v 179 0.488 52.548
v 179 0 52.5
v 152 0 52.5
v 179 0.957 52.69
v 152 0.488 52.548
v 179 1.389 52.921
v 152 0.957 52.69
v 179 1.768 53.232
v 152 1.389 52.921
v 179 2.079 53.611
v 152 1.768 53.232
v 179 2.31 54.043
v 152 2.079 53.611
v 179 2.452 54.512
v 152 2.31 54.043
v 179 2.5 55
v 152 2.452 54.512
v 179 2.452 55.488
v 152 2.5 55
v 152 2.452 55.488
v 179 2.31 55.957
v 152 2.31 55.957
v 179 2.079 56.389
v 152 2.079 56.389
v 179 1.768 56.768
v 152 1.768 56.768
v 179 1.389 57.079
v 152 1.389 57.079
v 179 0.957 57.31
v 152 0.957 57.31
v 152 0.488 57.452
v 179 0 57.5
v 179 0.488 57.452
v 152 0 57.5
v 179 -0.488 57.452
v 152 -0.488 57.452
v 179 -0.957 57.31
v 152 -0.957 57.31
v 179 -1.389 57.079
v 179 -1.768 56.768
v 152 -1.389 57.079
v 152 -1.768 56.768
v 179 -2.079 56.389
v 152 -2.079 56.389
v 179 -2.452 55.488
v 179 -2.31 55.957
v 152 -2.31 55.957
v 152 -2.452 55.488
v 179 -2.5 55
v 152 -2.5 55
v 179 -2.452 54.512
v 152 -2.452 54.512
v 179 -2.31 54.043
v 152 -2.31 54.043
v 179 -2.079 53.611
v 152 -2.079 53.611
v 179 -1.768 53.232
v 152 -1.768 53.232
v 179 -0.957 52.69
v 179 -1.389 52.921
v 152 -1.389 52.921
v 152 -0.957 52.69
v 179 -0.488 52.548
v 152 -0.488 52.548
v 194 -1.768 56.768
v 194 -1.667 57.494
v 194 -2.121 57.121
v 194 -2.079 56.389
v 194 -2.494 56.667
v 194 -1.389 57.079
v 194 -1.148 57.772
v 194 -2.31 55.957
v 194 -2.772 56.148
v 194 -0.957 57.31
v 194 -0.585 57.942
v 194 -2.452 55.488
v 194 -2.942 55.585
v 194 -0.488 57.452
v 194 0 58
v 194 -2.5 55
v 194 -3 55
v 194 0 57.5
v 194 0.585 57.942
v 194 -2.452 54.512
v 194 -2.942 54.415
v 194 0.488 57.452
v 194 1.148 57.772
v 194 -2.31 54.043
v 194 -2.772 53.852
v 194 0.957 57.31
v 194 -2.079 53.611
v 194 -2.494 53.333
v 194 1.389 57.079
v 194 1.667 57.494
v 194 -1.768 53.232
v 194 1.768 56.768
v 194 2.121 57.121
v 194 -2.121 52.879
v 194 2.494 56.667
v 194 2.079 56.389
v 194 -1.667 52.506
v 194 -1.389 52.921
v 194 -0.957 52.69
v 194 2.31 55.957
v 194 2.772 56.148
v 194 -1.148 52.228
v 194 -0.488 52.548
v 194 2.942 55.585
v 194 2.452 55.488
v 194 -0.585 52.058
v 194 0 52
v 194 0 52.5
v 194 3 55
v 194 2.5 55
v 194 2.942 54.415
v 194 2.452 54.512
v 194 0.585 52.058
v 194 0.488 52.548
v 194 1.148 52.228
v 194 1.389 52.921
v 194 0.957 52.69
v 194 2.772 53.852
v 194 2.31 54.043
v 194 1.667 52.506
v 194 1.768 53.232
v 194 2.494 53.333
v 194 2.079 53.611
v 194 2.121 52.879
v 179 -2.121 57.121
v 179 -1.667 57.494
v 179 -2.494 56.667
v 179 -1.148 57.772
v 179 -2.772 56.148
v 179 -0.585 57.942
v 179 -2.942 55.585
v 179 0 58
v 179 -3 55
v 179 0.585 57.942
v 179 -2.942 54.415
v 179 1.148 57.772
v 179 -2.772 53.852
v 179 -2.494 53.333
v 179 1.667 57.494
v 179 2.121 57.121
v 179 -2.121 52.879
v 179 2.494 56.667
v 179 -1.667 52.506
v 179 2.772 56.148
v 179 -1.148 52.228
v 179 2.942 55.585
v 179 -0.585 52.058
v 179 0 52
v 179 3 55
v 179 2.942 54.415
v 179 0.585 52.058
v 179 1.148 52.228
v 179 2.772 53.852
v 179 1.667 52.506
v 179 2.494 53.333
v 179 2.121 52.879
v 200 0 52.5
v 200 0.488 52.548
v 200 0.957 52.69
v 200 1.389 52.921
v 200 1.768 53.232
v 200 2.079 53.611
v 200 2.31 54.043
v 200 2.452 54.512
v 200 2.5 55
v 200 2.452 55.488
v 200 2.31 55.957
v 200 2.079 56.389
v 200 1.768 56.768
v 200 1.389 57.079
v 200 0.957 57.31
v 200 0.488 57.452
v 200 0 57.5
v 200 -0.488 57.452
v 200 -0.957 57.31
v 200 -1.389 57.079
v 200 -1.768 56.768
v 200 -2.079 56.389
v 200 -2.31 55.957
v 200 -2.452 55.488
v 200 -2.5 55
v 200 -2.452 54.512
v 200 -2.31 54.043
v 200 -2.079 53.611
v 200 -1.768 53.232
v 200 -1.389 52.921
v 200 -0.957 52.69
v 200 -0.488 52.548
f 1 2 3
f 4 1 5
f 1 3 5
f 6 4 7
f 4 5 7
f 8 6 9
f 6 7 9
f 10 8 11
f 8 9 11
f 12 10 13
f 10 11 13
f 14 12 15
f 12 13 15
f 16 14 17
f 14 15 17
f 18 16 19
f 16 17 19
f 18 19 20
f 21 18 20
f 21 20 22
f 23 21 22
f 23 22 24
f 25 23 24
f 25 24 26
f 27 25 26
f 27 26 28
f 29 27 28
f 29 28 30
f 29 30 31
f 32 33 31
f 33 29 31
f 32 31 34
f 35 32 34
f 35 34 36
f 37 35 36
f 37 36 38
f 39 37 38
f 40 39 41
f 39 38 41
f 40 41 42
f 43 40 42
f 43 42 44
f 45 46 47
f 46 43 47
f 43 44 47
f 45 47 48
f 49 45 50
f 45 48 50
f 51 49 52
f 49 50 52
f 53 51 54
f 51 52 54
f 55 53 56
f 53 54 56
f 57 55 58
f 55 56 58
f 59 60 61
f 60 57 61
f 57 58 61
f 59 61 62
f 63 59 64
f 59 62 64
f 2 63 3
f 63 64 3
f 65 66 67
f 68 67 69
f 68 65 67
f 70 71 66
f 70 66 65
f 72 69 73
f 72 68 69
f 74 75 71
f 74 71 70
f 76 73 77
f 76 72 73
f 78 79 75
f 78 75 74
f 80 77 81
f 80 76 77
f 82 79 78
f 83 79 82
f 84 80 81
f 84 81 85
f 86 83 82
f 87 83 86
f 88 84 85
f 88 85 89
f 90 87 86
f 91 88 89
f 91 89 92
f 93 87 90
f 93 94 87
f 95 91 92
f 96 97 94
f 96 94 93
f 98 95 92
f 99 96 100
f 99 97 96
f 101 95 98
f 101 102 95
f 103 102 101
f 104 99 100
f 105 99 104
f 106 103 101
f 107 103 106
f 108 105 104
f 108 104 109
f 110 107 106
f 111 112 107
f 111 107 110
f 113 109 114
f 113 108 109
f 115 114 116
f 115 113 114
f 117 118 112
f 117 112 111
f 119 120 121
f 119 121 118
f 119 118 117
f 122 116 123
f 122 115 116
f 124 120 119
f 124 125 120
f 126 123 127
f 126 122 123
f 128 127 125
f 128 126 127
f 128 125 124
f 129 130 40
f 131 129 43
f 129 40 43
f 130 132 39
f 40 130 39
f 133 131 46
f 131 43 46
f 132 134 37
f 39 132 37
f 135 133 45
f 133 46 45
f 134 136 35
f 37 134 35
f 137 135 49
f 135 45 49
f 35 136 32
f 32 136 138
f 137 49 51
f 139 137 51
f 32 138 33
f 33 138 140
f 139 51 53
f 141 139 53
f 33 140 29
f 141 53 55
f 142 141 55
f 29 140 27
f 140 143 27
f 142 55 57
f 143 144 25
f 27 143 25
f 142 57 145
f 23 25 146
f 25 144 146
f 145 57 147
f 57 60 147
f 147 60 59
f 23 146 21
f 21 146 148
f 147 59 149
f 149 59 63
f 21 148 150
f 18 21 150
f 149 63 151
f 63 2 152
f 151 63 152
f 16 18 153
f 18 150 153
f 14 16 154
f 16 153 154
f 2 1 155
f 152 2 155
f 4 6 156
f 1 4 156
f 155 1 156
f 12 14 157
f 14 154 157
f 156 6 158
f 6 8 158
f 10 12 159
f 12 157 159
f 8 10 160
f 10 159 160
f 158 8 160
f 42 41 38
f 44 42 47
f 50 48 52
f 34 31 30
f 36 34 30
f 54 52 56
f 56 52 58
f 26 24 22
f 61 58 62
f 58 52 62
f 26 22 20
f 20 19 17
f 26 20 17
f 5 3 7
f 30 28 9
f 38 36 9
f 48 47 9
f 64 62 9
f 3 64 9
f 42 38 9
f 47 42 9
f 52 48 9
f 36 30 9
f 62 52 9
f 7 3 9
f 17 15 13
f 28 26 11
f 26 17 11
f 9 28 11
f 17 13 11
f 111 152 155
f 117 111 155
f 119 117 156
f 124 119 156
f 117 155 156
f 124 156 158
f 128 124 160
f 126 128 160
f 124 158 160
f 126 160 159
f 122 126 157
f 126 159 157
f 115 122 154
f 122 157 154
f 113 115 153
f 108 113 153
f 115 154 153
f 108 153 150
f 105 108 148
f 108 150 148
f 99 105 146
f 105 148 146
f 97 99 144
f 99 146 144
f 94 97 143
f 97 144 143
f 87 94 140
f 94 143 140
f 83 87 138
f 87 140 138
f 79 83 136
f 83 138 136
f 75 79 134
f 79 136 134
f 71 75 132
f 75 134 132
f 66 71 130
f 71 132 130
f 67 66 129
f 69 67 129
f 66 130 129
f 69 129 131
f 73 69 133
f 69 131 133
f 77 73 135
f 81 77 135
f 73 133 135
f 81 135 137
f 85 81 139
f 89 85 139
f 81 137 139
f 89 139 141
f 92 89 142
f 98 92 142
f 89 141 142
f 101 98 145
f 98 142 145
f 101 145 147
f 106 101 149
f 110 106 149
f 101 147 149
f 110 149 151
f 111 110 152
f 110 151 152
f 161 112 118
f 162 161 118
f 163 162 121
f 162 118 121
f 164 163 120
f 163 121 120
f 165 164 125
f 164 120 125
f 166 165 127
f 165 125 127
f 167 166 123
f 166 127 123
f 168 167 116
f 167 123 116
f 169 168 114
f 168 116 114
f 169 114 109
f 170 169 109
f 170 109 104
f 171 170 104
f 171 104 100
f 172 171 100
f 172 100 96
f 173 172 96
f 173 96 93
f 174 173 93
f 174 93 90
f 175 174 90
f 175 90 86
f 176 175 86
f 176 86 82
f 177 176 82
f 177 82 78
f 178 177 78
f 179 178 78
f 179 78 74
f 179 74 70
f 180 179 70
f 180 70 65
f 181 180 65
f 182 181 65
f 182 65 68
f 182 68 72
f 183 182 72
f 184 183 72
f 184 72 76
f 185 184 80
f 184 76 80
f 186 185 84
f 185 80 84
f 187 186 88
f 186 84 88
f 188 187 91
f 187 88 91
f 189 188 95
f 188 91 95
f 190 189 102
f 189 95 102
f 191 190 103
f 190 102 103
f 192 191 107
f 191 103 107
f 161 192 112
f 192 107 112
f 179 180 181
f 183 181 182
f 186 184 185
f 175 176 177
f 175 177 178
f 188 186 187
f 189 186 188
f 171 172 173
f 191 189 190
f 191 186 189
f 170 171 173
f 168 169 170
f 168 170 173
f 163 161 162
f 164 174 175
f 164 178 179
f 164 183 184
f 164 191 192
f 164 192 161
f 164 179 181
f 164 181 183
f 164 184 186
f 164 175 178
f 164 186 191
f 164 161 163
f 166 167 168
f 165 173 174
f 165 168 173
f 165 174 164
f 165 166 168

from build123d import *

# Parameters (mm, degrees)
CYLINDER1492253_R     = 2.5
CYLINDER1492253_DEPTH = 48
CYLINDER1492303_R     = 3
CYLINDER1492303_DEPTH = 15


with BuildPart() as cylinder:
    # Cylinder1492253 → Cylinder1492253 (new body)
    with BuildSketch(Plane(origin=(152, 0, 55), x_dir=(0, 0, -1), z_dir=(1, 0, 0))):
        Circle(CYLINDER1492253_R)
    extrude(amount=CYLINDER1492253_DEPTH)


with BuildPart() as gearbox_shaft_steel:
    # Cylinder1492303 → Cylinder1492303 (new body)
    with BuildSketch(Plane(origin=(179, 0, 55), x_dir=(0, 0, -1), z_dir=(1, 0, 0))):
        Circle(CYLINDER1492303_R)
    extrude(amount=CYLINDER1492303_DEPTH)

    # Fusion: union Cylinder
    add(cylinder.part)


solid = gearbox_shaft_steel.part
